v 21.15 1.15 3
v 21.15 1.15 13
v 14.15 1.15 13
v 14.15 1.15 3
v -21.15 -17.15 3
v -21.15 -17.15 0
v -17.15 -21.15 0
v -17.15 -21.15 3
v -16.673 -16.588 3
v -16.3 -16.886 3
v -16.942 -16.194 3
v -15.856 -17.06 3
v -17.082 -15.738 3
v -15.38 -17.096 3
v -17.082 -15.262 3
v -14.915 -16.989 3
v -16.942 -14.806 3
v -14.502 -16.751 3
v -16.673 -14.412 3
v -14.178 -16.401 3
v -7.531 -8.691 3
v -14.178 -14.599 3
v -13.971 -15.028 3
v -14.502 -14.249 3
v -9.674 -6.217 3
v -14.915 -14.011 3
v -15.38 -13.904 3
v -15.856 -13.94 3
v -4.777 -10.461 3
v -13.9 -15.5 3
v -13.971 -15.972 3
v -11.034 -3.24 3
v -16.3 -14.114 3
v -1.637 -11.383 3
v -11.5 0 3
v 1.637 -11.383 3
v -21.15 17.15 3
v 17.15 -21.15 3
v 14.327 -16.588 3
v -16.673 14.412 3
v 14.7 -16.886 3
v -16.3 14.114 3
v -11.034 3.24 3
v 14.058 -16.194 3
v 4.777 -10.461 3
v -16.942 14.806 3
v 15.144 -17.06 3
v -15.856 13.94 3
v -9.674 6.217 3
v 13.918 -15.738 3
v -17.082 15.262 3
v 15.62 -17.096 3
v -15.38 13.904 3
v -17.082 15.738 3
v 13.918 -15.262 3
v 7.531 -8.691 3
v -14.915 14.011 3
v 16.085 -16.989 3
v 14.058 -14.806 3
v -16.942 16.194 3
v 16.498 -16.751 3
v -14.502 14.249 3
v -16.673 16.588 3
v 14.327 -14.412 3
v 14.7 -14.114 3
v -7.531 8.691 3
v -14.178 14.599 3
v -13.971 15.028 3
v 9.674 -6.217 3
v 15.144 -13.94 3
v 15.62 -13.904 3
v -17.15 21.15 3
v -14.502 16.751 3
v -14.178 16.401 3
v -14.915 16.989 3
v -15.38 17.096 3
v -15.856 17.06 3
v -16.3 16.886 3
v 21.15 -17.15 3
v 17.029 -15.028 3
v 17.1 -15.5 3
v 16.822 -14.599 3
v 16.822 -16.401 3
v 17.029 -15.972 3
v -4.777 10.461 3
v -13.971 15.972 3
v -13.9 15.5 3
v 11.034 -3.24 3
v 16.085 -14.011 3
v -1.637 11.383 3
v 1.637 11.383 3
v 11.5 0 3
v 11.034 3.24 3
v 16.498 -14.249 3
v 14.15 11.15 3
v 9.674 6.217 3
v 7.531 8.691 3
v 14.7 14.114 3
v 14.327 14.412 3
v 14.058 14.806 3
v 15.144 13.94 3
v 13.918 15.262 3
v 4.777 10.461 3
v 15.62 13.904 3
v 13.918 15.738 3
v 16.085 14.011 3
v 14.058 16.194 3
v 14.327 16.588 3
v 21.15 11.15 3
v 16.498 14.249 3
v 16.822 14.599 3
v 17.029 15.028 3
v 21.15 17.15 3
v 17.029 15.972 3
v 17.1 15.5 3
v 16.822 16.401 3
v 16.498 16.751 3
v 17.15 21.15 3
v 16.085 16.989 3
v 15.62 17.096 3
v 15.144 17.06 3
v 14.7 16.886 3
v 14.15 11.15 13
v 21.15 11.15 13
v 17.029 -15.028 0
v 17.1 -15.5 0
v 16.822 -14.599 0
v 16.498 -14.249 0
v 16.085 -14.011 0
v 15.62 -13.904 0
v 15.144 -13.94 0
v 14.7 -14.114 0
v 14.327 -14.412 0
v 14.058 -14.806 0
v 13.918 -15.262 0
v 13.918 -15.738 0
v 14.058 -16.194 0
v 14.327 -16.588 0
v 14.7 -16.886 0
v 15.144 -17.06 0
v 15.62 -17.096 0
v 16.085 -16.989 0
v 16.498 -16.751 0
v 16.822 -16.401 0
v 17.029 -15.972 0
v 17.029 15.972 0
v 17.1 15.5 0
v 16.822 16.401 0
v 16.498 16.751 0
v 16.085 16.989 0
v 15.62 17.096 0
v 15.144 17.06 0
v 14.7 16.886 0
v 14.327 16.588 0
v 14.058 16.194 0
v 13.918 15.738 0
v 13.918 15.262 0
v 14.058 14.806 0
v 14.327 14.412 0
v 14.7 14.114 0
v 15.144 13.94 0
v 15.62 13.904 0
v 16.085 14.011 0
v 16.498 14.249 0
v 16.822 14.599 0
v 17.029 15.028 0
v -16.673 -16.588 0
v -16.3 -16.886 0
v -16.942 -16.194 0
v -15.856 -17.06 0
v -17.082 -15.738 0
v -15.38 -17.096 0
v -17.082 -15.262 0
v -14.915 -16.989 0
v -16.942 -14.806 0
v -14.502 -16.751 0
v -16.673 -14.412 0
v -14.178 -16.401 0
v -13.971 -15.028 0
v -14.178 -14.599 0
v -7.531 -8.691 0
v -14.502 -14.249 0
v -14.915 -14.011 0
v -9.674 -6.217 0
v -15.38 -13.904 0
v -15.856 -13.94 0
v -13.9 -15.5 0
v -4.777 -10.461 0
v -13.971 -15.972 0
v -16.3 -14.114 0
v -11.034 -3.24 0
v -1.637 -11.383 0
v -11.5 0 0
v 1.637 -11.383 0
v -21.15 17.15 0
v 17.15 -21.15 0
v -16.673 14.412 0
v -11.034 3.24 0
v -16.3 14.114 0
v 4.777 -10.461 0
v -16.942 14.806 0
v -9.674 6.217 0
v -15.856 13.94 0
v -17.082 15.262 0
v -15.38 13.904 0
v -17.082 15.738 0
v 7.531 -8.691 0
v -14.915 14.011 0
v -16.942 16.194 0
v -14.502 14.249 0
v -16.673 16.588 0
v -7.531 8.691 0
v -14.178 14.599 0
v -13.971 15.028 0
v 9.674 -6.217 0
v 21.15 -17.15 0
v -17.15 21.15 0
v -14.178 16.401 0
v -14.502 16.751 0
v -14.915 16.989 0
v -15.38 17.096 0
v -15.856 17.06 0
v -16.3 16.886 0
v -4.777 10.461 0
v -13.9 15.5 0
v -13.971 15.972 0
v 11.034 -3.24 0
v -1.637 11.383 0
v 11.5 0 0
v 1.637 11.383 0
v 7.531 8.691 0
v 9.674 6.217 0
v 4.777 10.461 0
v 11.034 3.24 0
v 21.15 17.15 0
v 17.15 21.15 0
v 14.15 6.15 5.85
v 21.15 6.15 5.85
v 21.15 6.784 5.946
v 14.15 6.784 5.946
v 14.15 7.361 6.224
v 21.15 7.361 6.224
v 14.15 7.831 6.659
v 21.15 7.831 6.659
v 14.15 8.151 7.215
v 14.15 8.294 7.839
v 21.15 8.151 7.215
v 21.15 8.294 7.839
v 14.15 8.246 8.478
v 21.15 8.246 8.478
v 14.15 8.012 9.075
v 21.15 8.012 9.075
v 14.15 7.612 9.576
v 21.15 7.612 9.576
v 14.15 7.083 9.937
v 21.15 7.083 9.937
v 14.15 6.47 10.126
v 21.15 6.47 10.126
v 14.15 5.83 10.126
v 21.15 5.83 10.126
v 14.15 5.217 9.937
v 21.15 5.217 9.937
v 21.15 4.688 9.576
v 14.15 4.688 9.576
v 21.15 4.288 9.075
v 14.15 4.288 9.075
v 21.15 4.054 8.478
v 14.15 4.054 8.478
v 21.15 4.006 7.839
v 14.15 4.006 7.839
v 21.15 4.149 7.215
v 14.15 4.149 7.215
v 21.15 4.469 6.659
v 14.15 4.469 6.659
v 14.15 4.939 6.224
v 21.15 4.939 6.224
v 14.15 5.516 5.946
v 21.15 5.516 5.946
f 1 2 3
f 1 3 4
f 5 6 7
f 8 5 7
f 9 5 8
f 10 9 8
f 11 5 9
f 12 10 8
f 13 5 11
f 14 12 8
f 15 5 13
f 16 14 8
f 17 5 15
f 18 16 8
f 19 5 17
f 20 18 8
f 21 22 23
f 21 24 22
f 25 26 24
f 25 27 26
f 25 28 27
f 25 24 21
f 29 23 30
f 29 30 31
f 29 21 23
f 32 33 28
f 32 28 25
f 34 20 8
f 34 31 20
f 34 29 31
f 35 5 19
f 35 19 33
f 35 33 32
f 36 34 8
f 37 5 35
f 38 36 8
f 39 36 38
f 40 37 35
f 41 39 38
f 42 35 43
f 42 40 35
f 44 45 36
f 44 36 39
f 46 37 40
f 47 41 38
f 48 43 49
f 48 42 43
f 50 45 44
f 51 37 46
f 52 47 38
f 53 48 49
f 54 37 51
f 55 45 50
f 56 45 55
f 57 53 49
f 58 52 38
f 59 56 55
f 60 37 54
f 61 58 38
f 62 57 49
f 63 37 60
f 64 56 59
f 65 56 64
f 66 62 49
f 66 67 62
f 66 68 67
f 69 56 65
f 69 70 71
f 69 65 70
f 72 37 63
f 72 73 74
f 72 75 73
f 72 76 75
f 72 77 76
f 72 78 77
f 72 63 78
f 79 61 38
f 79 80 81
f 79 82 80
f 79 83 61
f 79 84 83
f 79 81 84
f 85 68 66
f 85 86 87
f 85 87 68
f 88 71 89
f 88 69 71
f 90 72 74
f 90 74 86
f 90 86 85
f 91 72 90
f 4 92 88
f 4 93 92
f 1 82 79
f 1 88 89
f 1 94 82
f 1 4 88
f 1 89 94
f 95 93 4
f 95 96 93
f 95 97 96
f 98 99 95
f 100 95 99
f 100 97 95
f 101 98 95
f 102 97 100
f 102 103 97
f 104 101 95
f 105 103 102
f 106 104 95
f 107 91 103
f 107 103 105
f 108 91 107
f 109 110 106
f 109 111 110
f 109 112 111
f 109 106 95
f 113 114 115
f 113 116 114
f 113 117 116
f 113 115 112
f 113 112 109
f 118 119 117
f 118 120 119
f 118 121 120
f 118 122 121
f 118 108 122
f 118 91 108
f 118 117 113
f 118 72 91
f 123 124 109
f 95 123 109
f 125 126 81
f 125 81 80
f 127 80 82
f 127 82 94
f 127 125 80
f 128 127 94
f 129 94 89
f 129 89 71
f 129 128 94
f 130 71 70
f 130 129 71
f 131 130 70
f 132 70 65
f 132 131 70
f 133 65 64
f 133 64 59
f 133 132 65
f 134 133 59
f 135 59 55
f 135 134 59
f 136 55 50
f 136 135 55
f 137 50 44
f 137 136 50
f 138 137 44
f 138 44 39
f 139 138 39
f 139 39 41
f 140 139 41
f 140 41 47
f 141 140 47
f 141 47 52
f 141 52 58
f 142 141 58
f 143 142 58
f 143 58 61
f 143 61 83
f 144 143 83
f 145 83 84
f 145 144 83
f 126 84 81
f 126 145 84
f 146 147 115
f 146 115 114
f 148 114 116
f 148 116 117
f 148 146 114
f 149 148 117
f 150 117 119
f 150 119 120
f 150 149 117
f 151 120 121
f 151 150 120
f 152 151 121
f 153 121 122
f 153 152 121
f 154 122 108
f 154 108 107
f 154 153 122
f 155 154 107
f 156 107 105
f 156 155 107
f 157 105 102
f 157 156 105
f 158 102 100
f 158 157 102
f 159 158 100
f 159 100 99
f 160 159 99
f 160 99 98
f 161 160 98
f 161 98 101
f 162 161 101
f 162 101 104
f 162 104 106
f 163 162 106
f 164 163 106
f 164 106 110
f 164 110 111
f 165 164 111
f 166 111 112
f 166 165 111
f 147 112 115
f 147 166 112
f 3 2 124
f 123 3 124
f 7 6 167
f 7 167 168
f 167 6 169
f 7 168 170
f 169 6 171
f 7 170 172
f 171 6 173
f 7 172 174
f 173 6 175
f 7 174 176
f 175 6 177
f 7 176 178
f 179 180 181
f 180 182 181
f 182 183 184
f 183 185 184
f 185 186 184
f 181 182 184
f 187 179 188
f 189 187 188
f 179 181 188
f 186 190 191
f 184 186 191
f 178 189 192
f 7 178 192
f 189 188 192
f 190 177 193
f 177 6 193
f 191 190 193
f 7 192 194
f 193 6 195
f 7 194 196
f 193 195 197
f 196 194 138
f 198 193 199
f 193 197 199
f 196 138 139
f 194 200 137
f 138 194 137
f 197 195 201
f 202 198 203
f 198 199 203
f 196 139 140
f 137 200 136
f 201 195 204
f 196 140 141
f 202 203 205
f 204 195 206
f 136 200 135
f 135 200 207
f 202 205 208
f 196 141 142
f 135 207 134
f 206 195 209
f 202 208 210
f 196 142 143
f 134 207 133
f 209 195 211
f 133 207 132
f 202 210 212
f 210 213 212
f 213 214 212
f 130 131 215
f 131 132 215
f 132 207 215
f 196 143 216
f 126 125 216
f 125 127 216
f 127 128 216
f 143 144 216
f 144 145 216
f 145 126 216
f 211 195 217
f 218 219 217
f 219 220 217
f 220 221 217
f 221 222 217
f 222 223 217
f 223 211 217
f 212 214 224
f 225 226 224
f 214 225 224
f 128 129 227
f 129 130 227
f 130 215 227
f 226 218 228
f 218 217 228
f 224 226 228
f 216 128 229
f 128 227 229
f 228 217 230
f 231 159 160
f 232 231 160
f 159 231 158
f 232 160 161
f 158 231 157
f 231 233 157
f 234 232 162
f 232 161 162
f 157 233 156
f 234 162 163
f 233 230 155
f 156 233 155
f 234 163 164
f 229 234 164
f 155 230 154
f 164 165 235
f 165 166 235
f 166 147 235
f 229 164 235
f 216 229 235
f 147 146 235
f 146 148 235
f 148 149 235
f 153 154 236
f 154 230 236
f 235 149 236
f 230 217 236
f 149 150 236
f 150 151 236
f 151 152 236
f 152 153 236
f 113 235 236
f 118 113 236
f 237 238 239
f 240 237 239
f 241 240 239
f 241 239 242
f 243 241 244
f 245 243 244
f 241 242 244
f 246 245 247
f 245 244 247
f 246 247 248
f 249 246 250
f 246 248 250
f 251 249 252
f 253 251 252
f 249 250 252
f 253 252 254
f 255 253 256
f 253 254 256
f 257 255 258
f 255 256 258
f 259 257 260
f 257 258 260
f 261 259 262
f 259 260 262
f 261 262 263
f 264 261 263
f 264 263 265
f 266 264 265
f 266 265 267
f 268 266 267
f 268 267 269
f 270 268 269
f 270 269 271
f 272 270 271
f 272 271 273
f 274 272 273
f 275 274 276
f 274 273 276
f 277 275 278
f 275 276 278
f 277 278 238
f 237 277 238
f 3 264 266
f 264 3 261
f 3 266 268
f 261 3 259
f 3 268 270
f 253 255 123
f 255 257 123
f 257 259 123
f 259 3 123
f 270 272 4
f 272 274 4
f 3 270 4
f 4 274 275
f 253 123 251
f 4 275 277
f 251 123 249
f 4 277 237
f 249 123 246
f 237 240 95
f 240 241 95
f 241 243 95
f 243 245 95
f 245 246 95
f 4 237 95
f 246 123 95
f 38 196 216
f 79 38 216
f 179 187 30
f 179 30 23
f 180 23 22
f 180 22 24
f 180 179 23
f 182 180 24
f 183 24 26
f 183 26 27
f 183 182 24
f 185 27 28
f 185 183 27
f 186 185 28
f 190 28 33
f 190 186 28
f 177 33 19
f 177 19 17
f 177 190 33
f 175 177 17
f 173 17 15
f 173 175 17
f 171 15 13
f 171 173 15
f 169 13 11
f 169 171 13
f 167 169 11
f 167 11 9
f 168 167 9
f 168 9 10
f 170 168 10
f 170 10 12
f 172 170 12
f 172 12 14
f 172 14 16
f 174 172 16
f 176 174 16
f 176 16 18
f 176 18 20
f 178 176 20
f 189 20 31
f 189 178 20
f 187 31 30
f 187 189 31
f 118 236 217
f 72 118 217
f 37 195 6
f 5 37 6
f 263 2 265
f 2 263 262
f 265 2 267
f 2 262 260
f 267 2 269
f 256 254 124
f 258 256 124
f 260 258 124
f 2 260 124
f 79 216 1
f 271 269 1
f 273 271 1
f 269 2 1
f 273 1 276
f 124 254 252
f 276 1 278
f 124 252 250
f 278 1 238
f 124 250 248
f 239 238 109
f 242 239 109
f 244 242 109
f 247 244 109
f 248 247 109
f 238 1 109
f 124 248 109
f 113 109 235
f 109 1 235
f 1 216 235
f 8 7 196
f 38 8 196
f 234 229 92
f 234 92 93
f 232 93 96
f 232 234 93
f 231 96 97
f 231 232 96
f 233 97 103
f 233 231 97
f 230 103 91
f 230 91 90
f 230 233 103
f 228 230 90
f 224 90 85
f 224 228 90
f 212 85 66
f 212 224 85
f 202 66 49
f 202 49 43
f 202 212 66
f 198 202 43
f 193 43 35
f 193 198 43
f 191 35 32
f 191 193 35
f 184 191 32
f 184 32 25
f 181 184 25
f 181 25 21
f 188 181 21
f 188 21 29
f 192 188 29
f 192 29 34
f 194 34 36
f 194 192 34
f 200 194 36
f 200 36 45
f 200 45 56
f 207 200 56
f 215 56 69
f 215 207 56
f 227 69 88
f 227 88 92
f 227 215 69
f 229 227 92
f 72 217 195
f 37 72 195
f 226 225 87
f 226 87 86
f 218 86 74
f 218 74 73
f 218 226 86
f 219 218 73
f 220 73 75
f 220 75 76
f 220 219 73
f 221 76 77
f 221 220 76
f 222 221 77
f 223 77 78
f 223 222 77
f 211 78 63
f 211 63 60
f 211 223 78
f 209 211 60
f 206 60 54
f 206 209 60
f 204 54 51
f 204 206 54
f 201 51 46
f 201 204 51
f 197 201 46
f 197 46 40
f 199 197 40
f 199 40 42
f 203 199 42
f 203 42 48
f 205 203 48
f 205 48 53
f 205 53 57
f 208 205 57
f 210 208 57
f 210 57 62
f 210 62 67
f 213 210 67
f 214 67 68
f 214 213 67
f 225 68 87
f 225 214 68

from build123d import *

# Parameters (mm, degrees)
CROQUIS1_R              = 11.5
CROQUIS1_R_2            = 1.6
SALIENTE_EXTRUIR1_DEPTH = 3
CROQUIS2_W              = 10
CROQUIS2_H              = 10
CROQUIS2_R              = 2.15
SALIENTE_EXTRUIR2_DEPTH = 7


with BuildPart() as part:
    # Croquis1 → Saliente-Extruir1 (new body)
    with BuildSketch(Plane.XY):
        Polygon((21.15, 17.15), (17.15, 21.15), (-17.15, 21.15), (-21.15, 17.15), (-21.15, -17.15), (-17.15, -21.15), (17.15, -21.15), (21.15, -17.15), align=None)
        Circle(CROQUIS1_R, mode=Mode.SUBTRACT)
        with Locations((15.5, 15.5)):
            Circle(CROQUIS1_R_2, mode=Mode.SUBTRACT)
        with Locations((15.5, -15.5)):
            Circle(CROQUIS1_R_2, mode=Mode.SUBTRACT)
        with Locations((-15.5, -15.5)):
            Circle(CROQUIS1_R_2, mode=Mode.SUBTRACT)
        with Locations((-15.5, 15.5)):
            Circle(CROQUIS1_R_2, mode=Mode.SUBTRACT)
    extrude(amount=SALIENTE_EXTRUIR1_DEPTH)

    # Croquis2 → Saliente-Extruir2 (add)
    with BuildSketch(Plane(origin=(21.15, 0, 0), x_dir=(0, 0, -1), z_dir=(1, 0, 0))):
        with Locations((-8, 6.15)):
            Rectangle(CROQUIS2_W, CROQUIS2_H)
        with Locations((-8, 6.15)):
            Circle(CROQUIS2_R, mode=Mode.SUBTRACT)
    extrude(amount=-SALIENTE_EXTRUIR2_DEPTH)


solid = part.part
